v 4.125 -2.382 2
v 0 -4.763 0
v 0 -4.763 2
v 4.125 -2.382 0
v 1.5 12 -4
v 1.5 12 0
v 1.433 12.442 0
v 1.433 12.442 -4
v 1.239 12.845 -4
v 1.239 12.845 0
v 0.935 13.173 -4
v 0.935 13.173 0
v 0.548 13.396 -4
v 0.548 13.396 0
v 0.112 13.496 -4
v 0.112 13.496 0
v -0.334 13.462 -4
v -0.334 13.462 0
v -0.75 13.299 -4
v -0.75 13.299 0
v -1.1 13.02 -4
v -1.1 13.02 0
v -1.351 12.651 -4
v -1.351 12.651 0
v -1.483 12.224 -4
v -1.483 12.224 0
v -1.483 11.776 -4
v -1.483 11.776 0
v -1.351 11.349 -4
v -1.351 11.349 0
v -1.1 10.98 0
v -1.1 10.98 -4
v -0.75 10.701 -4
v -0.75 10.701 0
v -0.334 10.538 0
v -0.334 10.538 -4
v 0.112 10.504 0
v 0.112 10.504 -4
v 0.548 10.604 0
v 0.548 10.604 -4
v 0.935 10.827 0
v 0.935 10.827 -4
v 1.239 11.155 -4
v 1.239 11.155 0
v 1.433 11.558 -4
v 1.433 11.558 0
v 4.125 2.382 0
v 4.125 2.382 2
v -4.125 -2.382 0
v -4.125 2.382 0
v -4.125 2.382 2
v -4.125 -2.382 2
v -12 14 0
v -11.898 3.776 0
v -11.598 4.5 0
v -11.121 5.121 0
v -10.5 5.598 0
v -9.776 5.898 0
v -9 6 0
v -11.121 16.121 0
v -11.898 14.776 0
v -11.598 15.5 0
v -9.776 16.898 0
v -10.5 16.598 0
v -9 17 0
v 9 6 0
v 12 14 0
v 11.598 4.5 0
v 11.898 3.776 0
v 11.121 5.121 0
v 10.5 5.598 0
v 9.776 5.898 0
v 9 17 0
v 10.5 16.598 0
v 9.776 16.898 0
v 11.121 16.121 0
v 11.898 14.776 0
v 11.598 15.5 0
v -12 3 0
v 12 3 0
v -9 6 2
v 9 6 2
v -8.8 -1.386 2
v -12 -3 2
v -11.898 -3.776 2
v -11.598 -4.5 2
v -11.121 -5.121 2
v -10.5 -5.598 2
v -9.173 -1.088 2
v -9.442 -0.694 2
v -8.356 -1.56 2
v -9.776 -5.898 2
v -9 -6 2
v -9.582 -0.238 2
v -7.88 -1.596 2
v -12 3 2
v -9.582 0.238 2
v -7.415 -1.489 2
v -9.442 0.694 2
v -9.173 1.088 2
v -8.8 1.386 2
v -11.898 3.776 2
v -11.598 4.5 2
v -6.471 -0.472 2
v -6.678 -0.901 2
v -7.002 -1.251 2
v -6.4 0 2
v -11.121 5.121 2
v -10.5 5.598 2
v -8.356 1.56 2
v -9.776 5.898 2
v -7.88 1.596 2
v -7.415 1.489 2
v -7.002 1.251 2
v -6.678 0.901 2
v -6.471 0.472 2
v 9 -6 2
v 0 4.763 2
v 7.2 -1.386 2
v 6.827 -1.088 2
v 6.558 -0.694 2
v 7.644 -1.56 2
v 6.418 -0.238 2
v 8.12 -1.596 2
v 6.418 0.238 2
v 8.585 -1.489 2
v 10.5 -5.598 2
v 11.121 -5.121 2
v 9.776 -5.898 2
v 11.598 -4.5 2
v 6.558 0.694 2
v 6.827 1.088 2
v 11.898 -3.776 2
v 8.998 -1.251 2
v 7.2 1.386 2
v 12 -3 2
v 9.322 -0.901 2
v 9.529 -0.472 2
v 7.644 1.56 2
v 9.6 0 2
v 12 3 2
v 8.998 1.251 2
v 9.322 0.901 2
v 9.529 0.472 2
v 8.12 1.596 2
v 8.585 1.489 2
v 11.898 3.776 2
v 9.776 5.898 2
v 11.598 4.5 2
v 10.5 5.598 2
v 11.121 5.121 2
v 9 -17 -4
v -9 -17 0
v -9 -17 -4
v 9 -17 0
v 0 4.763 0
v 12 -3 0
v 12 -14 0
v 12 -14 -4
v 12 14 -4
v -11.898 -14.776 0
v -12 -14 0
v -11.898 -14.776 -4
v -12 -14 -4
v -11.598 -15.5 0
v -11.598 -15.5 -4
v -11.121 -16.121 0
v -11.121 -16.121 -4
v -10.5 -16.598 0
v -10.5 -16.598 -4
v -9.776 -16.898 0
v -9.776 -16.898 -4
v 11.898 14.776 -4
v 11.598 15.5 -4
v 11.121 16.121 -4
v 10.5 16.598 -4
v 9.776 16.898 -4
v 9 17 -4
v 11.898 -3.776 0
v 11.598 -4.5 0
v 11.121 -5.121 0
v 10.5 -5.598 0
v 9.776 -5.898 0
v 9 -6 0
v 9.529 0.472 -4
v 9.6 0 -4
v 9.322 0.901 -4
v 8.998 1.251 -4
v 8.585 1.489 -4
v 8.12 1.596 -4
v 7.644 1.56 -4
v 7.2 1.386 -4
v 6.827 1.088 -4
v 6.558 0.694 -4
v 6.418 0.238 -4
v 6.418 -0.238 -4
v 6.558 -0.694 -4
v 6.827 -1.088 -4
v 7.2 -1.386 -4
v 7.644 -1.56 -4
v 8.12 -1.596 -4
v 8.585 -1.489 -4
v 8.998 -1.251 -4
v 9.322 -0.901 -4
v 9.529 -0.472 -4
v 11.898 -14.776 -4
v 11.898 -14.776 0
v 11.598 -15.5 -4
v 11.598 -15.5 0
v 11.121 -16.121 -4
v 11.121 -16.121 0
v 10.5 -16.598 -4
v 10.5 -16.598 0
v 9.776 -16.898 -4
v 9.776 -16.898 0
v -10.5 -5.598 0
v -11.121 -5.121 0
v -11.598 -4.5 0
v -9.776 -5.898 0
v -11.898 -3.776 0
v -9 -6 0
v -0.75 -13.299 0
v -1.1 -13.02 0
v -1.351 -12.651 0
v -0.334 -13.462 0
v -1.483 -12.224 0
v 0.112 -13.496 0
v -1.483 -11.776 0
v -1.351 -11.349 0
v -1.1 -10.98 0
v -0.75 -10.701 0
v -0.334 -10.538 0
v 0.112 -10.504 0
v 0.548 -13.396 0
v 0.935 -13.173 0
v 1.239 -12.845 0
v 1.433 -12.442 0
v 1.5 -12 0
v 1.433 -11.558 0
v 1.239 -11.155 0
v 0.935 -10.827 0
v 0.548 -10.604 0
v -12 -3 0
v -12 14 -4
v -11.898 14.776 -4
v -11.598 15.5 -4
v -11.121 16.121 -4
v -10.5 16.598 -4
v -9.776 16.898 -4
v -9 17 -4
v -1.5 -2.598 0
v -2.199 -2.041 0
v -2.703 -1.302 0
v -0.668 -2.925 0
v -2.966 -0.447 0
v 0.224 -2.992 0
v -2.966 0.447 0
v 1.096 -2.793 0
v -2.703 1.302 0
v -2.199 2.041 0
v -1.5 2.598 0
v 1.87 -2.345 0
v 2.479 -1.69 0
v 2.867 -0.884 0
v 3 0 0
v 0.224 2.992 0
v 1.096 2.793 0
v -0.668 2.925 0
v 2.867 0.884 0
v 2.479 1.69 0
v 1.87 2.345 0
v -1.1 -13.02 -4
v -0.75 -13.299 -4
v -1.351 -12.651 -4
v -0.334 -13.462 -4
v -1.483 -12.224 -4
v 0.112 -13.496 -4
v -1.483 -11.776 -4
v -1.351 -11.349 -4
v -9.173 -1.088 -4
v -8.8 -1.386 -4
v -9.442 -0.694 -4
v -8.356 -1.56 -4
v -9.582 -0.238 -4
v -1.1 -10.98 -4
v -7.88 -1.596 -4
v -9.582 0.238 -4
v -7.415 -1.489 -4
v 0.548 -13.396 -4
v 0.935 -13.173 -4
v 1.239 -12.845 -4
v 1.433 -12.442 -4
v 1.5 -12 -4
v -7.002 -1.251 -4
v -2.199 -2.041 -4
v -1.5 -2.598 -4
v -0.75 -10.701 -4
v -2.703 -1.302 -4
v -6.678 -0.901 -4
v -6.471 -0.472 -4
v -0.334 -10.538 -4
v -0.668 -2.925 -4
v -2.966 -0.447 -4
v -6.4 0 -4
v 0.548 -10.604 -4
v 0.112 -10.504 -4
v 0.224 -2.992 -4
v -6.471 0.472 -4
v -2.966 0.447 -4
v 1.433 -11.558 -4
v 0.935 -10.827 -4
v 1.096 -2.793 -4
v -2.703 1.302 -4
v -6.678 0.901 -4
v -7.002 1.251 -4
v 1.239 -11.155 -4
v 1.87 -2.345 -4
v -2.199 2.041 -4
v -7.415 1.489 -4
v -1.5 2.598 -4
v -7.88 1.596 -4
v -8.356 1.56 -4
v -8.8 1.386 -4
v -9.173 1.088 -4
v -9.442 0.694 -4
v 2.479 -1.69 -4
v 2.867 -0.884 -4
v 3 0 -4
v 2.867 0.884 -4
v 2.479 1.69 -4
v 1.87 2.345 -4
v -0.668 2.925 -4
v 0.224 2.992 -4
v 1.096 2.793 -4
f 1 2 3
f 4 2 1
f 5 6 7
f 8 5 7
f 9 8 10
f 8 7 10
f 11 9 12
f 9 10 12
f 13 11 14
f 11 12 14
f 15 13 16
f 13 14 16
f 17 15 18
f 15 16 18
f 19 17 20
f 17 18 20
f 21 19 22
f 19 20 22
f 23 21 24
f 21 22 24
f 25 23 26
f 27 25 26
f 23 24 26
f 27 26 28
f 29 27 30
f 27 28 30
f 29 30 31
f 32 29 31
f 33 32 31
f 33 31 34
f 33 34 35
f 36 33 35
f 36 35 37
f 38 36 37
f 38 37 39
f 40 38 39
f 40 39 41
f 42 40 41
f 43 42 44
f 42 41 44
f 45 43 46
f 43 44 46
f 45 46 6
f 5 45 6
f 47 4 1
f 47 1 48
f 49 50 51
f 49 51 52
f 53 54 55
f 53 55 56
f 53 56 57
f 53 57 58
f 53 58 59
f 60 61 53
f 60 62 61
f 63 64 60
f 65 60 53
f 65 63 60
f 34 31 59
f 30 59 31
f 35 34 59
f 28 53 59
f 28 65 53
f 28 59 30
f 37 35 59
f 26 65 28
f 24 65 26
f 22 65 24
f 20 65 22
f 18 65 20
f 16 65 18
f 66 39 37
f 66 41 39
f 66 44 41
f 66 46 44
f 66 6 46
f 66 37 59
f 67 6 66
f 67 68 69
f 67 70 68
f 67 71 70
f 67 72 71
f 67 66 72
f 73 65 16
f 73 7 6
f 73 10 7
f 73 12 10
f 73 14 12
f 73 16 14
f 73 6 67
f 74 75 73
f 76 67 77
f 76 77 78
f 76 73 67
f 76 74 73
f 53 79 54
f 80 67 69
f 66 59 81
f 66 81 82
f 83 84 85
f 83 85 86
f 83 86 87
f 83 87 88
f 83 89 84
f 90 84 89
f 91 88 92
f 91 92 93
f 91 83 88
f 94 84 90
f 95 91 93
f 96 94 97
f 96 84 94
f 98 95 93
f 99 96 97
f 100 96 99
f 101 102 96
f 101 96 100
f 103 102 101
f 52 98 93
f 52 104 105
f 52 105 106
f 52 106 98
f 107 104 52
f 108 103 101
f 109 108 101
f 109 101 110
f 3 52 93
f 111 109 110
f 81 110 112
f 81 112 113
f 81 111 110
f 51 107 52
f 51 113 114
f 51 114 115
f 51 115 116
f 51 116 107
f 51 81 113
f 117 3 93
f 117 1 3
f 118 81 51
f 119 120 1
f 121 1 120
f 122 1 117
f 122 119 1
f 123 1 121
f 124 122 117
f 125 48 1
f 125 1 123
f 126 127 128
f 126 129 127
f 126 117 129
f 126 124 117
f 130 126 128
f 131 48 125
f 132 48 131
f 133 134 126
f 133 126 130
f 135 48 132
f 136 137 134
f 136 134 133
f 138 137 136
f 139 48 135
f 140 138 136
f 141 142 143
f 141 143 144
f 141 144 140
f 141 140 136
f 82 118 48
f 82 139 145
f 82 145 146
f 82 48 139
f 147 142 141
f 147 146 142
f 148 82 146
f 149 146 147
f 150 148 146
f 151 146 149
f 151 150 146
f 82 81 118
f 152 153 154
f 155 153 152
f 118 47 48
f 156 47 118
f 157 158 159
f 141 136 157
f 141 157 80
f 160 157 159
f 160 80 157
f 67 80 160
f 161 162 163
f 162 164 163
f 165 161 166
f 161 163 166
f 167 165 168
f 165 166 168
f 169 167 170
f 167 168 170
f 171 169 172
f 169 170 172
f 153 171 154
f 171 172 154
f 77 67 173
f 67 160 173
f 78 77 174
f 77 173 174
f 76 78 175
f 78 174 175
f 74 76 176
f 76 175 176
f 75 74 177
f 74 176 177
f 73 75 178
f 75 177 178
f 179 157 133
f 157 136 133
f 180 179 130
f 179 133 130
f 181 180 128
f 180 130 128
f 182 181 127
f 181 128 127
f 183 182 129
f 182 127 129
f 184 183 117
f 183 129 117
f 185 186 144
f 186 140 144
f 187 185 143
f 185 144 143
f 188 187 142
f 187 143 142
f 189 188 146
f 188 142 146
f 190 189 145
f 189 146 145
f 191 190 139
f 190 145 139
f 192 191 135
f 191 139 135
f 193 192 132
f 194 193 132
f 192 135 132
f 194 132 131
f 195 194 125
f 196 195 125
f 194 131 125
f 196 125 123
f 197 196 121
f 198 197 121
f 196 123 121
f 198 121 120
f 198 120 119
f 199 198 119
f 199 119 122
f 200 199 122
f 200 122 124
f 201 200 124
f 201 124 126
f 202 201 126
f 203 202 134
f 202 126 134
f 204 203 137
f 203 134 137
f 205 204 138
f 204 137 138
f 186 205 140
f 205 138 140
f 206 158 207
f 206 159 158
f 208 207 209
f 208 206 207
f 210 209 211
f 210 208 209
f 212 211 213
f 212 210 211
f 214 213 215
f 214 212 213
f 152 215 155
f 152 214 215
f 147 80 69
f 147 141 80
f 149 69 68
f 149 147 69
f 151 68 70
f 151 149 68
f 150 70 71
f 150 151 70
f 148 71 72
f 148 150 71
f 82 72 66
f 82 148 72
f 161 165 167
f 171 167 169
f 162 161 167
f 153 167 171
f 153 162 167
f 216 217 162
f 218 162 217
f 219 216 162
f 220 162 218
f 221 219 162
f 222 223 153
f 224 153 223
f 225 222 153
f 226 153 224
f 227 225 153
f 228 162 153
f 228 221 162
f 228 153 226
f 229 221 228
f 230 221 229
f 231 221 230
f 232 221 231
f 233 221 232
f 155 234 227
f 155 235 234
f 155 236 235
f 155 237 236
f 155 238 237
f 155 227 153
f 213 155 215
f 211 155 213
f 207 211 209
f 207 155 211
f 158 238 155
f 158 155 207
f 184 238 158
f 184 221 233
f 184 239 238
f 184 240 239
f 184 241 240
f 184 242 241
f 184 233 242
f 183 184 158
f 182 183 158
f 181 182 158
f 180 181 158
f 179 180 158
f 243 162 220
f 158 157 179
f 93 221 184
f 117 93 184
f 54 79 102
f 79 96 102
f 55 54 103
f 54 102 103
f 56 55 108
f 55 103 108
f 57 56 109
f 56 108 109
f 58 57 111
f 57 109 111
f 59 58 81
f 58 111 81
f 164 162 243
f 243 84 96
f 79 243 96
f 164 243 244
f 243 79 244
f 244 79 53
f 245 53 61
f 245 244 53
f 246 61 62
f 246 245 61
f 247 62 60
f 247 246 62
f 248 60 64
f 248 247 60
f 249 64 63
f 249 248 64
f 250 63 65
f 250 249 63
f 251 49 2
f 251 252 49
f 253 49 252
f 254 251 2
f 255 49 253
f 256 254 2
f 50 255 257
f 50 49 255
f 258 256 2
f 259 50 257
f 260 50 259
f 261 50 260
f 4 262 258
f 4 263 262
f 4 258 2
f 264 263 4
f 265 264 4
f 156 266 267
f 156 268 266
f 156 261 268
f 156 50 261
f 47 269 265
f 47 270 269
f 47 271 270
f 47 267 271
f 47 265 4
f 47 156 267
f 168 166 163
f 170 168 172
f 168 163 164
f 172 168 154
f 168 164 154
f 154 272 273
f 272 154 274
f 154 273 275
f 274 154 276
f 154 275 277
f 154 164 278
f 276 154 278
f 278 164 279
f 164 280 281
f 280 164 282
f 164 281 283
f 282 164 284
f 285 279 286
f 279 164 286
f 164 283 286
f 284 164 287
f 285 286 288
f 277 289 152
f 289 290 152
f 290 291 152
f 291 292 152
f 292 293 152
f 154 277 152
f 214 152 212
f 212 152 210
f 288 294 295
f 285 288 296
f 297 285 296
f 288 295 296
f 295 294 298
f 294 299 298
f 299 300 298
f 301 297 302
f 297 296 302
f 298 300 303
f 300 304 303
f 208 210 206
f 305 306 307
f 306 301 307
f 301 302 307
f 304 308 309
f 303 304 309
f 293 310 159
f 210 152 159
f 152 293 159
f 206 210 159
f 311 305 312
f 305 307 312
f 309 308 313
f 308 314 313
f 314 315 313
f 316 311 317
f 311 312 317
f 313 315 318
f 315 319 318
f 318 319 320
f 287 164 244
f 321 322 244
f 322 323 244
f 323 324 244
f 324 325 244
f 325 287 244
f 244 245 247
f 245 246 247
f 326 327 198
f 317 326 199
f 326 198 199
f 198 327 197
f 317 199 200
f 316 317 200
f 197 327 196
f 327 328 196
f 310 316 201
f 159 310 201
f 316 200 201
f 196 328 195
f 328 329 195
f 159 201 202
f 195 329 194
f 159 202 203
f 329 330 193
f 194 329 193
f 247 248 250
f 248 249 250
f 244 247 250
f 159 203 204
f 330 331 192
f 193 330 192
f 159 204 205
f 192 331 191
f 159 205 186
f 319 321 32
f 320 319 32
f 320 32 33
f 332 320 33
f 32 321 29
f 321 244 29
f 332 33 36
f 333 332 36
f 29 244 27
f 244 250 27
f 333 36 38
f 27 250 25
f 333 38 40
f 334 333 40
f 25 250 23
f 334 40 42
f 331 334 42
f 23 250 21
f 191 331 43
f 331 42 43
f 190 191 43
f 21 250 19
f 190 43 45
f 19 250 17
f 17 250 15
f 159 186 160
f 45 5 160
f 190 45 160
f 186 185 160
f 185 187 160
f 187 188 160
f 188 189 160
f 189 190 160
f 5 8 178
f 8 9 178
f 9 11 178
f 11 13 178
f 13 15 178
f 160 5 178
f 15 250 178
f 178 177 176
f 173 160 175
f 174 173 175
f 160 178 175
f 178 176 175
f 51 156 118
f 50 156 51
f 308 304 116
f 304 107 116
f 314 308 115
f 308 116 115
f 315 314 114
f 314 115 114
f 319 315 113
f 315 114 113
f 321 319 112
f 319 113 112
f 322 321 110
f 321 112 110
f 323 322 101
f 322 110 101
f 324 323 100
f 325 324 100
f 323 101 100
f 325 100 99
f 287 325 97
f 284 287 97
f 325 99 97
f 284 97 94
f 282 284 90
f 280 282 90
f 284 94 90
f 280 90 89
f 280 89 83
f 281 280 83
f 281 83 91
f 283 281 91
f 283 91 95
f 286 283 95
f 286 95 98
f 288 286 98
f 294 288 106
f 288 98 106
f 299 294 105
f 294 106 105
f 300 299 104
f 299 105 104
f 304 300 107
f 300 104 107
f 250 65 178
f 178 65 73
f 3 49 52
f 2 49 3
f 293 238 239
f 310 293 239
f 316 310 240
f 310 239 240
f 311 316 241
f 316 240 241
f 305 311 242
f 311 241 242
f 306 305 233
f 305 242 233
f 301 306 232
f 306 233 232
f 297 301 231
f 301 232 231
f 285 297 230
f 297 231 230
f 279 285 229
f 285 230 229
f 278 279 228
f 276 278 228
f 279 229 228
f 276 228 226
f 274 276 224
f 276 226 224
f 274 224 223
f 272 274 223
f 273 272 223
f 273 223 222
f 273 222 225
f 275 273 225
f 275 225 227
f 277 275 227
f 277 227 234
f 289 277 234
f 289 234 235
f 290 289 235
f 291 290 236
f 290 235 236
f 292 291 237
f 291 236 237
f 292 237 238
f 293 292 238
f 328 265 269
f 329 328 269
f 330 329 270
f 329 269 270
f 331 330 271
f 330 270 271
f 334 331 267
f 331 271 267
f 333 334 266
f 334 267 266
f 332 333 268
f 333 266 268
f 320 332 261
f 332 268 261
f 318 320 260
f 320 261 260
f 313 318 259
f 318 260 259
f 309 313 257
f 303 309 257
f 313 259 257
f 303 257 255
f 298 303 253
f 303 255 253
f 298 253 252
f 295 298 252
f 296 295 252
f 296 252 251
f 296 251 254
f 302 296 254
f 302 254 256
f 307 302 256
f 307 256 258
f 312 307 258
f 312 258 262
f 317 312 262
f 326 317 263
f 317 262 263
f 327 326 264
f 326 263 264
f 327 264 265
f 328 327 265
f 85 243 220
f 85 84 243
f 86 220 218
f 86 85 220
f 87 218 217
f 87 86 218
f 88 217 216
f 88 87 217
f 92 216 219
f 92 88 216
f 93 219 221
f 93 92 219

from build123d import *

# Parameters (mm, degrees)
SKETCH_W          = 24
SKETCH_H          = 34
SKETCH_R          = 1.5
SKETCH_R_2        = 3
PAD_DEPTH         = 4
SKETCH001_W       = 24
SKETCH001_H       = 12
PAD001_DEPTH      = 2
SKETCH002_R       = 1.6
POCKET_DEPTH      = 4.001
POCKET_DEPTH_BACK = -2.001
FILLET_R          = 3


with BuildPart() as part:
    # Sketch → Pad (new body)
    with BuildSketch(Plane.XY):
        Rectangle(SKETCH_W, SKETCH_H)
        with Locations((0, 12)):
            Circle(SKETCH_R, mode=Mode.SUBTRACT)
        with Locations((0, -12)):
            Circle(SKETCH_R, mode=Mode.SUBTRACT)
        Circle(SKETCH_R_2, mode=Mode.SUBTRACT)
    extrude(amount=-PAD_DEPTH)

    # Sketch001 → Pad001 (join)
    with BuildSketch(Plane.XY):
        Rectangle(SKETCH001_W, SKETCH001_H)
        Polygon((4.125, -2.38157), (4.125, 2.38157), (0, 4.76314), (-4.125, 2.38157), (-4.125, -2.38157), (0, -4.76314), align=None, mode=Mode.SUBTRACT)
    extrude(amount=PAD001_DEPTH)

    # Sketch002 → Pocket (cut, two sides)
    with BuildSketch(Plane.XY) as pocket_sk:
        with Locations((-8, 0)):
            Circle(SKETCH002_R)
        with Locations((8, 0)):
            Circle(SKETCH002_R)
    extrude(amount=-POCKET_DEPTH, mode=Mode.SUBTRACT)
    extrude(pocket_sk.sketch, amount=-POCKET_DEPTH_BACK, mode=Mode.SUBTRACT)

    # Fillet
    fillet_edges = [part.edges().sort_by_distance(p)[0] for p in [
        (-12, -17, -2),
        (12, -17, -2),
        (12, -6, 1),
        (-12, -6, 1),
        (-12, 6, 1),
        (12, 6, 1),
        (12, 17, -2),
        (-12, 17, -2),
    ]]
    fillet(fillet_edges, radius=FILLET_R)


solid = part.part
